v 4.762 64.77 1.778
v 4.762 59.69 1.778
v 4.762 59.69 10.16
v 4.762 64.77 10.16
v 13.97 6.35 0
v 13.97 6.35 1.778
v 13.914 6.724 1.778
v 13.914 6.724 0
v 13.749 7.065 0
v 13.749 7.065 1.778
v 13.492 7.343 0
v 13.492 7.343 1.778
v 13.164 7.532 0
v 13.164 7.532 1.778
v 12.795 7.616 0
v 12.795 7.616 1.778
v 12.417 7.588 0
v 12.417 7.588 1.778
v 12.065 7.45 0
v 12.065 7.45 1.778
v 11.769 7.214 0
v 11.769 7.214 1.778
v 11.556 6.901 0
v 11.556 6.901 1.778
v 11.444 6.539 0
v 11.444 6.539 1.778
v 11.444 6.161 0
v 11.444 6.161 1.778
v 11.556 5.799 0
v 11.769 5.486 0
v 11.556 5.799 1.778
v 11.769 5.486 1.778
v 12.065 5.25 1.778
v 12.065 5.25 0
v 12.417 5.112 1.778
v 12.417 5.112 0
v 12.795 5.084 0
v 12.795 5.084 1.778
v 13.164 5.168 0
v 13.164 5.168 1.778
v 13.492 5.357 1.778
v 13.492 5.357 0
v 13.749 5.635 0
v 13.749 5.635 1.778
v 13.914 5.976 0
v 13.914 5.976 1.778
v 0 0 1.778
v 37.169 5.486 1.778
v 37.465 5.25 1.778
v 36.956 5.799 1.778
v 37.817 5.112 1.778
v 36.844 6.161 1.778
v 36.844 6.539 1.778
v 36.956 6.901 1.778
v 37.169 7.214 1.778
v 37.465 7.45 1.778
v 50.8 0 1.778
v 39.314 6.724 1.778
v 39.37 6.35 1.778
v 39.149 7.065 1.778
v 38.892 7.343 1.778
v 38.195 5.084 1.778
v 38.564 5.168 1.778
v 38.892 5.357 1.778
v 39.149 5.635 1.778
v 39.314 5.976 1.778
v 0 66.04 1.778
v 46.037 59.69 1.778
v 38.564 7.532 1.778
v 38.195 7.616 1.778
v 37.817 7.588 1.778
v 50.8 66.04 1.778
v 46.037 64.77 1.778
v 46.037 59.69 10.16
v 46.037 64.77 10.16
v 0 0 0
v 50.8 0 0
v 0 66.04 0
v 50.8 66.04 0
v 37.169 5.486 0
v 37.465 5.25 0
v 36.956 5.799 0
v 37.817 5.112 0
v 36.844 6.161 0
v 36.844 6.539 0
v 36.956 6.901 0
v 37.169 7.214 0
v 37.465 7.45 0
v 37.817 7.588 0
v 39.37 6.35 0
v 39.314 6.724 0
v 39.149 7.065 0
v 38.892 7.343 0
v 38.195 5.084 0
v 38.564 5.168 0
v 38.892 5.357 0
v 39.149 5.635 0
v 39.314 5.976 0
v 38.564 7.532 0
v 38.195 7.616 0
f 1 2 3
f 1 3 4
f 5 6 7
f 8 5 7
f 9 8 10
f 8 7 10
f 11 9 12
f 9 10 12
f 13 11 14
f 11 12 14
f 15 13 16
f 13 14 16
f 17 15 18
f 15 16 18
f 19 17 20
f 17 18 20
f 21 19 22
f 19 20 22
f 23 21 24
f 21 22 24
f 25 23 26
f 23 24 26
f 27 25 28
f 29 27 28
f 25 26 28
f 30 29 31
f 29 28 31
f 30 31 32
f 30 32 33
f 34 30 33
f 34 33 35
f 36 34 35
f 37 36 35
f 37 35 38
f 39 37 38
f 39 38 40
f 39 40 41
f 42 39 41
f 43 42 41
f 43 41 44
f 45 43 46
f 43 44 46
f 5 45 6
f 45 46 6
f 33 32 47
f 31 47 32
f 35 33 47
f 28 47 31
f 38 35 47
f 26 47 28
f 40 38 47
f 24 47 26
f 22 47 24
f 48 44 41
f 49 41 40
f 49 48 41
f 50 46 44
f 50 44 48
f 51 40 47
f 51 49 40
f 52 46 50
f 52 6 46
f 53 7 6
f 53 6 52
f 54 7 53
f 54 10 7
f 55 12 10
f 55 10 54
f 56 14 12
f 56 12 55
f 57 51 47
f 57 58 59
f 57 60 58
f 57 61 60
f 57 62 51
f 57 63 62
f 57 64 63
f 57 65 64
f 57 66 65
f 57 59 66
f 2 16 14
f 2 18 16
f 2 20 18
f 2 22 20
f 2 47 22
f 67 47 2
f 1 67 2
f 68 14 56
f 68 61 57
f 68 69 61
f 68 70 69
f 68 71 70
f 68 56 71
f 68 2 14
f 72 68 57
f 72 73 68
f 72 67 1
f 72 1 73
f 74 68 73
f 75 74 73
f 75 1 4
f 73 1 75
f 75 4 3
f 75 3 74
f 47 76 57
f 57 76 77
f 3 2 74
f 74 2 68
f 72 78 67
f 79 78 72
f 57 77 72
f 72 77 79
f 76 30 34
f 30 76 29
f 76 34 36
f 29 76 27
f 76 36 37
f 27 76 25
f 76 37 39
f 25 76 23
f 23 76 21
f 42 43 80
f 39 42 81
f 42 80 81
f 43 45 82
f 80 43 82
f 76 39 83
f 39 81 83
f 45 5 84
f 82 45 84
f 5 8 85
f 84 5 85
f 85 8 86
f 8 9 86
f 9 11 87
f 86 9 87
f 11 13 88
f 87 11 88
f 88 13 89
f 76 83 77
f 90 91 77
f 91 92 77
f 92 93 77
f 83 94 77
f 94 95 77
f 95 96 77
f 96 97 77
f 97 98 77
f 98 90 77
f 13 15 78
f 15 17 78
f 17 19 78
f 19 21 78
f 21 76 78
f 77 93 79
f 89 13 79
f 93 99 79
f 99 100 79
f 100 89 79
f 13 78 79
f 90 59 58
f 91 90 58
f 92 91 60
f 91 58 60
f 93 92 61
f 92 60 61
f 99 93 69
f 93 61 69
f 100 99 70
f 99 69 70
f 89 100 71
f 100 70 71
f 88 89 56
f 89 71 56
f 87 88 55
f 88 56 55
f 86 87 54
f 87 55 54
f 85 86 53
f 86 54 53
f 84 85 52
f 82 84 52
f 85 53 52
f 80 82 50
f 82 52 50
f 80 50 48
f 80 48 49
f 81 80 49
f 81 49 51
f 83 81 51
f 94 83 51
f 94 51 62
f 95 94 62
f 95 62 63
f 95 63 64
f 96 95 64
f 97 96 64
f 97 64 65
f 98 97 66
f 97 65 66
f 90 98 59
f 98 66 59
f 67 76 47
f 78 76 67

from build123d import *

# Parameters (mm, degrees)
SKETCH1_W           = 50.8
SKETCH1_H           = 66.04
BOSS_EXTRUDE1_DEPTH = 1.778
SKETCH2_W           = 41.275
SKETCH2_H           = 5.08
BOSS_EXTRUDE2_DEPTH = 8.382
SKETCH3_R           = 1.27
CUT_EXTRUDE1_DEPTH  = 1.778


with BuildPart() as part:
    # Sketch1 → Boss-Extrude1 (new body)
    with BuildSketch(Plane.XY):
        with Locations((25.4, 33.02)):
            Rectangle(SKETCH1_W, SKETCH1_H)
    extrude(amount=BOSS_EXTRUDE1_DEPTH)

    # Sketch2 → Boss-Extrude2 (add)
    with BuildSketch(Plane.XY.offset(1.778)):
        with Locations((25.4, 62.23)):
            Rectangle(SKETCH2_W, SKETCH2_H)
    extrude(amount=BOSS_EXTRUDE2_DEPTH)

    # Sketch3 → Cut-Extrude1 (cut)
    with BuildSketch(Plane.XY.offset(1.778)):
        with Locations((12.7, 6.35)):
            Circle(SKETCH3_R)
        with Locations((38.1, 6.35)):
            Circle(SKETCH3_R)
    extrude(amount=-CUT_EXTRUDE1_DEPTH, mode=Mode.SUBTRACT)


solid = part.part
